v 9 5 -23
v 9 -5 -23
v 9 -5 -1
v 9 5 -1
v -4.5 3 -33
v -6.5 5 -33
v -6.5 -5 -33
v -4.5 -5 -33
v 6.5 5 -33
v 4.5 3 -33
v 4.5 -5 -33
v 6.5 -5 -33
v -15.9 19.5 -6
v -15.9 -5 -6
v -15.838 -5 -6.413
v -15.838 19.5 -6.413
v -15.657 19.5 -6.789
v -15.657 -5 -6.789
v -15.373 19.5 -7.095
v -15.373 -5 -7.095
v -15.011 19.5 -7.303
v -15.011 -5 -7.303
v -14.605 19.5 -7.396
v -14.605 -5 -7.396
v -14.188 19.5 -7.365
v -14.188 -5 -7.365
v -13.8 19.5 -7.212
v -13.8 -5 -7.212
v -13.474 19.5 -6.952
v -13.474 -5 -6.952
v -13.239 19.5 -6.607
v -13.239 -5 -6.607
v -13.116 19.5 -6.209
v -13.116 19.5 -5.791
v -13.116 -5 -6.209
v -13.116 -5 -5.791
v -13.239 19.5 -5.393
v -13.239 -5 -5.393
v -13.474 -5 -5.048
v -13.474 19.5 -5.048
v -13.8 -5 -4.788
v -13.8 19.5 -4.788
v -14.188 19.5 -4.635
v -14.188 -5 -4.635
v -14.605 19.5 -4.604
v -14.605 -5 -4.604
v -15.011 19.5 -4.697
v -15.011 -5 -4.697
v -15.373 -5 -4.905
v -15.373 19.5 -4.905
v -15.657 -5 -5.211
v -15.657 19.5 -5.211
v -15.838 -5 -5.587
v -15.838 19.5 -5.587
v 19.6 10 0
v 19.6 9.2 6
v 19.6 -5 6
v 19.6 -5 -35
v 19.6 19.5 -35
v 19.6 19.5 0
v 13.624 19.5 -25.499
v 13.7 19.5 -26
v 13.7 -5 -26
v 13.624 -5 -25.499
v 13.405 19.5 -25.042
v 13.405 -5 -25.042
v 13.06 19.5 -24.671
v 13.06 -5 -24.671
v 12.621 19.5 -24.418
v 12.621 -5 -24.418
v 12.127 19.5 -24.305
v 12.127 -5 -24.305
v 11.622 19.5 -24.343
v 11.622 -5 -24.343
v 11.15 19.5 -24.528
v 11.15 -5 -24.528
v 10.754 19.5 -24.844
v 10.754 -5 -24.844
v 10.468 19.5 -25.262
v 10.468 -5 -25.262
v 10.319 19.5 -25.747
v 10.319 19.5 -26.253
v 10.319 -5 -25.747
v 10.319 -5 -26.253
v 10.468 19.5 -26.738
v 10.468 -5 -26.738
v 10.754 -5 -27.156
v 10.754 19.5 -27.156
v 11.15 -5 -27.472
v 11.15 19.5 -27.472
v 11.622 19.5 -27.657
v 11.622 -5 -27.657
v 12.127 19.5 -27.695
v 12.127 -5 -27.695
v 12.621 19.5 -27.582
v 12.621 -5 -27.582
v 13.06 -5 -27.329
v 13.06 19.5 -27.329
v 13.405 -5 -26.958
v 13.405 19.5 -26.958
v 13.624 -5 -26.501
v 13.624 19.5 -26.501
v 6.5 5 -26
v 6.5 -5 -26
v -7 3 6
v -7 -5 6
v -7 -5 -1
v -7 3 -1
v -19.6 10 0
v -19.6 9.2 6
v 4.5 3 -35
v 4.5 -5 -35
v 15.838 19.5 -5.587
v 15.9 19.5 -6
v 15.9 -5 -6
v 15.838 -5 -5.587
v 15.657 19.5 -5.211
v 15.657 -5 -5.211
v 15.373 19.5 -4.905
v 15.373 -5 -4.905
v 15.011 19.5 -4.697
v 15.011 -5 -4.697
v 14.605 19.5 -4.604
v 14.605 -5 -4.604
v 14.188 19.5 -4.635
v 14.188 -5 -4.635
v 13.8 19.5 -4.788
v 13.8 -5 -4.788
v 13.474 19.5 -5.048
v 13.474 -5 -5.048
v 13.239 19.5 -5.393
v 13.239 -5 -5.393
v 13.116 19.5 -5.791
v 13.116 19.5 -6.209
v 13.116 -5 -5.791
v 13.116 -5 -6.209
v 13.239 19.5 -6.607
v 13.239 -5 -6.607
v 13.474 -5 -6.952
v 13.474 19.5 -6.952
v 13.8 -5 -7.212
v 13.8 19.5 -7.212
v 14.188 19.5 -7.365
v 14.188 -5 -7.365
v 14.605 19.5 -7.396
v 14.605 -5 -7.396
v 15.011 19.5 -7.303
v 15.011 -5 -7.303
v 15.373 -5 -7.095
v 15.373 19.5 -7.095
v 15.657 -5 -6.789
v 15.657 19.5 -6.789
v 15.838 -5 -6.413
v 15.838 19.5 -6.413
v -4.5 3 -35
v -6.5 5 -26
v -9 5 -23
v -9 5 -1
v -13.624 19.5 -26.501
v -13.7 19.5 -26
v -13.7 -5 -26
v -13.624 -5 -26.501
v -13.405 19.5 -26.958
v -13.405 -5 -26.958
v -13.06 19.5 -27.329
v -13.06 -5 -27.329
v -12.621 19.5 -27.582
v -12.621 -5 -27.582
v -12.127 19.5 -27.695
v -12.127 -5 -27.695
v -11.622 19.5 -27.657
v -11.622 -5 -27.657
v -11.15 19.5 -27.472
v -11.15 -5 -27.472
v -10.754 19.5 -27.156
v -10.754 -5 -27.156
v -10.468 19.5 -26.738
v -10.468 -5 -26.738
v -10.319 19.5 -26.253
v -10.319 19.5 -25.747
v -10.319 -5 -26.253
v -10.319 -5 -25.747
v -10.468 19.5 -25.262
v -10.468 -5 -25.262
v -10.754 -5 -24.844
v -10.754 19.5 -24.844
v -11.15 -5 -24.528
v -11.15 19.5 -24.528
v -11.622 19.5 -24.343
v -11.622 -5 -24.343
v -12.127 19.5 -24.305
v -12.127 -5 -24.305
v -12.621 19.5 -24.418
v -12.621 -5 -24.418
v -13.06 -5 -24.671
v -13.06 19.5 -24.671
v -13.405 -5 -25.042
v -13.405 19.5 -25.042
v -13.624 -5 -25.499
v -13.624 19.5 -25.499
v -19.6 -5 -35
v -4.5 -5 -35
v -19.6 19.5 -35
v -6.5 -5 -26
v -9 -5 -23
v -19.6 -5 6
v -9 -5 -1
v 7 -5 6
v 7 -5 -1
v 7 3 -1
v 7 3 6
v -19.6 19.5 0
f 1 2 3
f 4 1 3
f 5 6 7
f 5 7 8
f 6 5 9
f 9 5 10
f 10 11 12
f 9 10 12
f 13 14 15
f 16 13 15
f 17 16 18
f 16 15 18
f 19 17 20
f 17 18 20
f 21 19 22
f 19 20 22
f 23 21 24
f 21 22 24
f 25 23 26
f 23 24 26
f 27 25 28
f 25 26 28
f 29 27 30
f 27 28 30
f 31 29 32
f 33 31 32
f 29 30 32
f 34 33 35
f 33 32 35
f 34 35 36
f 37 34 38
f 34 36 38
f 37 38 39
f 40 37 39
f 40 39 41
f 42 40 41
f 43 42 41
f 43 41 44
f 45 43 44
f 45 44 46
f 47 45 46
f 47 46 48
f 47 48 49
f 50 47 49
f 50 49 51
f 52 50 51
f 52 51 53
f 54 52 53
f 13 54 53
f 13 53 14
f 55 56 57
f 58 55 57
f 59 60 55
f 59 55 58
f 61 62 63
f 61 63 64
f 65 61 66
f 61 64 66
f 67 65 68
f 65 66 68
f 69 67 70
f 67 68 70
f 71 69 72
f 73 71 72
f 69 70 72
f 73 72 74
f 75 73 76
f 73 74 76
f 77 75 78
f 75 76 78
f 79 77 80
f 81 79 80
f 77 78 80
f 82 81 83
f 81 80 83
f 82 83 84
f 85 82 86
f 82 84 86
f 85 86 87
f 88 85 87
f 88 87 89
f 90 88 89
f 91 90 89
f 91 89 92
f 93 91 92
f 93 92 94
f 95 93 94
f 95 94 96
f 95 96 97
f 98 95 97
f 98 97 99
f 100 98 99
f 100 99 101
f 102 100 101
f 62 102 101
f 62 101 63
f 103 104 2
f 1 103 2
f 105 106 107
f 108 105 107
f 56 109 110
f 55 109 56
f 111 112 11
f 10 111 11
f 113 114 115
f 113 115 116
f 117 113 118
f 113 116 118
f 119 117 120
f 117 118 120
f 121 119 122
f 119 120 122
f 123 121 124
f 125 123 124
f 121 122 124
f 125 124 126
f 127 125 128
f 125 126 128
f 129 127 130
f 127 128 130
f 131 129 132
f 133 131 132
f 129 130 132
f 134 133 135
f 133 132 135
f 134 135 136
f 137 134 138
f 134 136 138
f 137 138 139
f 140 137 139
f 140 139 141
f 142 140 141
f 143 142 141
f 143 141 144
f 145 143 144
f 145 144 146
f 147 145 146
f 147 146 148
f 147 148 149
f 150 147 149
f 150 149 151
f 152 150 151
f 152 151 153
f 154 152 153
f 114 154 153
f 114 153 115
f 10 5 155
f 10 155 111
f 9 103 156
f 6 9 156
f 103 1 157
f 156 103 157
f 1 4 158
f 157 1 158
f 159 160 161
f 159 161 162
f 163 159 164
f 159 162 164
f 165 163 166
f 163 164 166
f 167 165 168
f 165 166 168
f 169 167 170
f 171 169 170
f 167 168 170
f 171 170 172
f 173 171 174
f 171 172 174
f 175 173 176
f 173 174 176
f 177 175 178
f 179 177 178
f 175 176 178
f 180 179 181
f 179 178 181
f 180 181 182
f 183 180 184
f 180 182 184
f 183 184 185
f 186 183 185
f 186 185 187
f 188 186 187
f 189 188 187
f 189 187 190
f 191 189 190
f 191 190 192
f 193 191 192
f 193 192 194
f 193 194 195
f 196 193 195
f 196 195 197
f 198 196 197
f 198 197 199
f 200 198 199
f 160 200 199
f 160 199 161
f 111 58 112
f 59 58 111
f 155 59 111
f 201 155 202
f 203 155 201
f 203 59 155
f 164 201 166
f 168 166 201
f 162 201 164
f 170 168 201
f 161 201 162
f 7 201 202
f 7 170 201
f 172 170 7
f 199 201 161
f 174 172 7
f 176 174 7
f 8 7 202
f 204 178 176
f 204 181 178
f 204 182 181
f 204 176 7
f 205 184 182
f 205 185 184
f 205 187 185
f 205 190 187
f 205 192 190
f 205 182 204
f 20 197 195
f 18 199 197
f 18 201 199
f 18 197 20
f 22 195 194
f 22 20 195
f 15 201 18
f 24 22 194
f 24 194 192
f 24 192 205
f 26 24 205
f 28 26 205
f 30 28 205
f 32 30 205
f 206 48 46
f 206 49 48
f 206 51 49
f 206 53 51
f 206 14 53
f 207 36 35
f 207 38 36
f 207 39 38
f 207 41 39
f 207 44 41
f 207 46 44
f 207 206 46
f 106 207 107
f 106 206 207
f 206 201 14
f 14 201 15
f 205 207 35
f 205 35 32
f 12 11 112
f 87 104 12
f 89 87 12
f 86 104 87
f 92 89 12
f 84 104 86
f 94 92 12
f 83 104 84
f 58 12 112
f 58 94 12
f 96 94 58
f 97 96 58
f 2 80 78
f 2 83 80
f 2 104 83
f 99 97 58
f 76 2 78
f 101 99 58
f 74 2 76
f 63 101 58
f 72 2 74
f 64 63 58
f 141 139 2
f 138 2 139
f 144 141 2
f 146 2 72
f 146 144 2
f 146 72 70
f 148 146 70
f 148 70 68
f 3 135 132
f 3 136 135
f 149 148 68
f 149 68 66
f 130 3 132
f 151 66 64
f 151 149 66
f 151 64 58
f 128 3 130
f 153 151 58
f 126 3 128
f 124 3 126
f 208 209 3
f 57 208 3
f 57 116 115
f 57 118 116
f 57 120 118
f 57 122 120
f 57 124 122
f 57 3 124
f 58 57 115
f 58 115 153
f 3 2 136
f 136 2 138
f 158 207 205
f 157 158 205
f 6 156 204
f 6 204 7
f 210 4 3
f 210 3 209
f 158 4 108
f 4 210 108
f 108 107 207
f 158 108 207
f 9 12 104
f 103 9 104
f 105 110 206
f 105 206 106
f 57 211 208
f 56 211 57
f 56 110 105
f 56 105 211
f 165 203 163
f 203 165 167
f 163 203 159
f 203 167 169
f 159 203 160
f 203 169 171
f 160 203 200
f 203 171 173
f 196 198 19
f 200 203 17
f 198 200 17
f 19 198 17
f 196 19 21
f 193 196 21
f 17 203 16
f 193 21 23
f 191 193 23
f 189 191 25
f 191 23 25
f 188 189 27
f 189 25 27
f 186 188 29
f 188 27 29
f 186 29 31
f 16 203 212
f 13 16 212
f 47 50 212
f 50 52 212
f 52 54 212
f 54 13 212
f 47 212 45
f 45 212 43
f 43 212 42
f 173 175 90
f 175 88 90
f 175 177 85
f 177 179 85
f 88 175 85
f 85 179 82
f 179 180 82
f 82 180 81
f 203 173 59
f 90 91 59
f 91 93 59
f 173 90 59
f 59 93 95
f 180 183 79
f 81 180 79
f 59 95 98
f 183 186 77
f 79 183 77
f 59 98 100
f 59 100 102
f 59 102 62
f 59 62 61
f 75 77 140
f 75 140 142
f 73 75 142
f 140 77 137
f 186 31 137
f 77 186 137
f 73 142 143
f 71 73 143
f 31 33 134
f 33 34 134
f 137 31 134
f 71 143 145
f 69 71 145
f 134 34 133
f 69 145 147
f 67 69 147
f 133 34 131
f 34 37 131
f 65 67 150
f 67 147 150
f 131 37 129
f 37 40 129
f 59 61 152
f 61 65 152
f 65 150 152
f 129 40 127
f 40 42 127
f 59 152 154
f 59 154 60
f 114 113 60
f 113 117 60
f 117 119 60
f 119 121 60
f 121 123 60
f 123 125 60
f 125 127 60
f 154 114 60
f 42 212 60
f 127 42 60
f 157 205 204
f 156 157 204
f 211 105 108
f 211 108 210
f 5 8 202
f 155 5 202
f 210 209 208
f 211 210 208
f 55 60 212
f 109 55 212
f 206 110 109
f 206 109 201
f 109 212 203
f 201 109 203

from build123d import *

# Parameters (mm, degrees)
SKETCH_1_W          = 40
SKETCH_1_H          = 20
EXTRUDE_1_DEPTH     = 6
SKETCH_2_W          = 40
SKETCH_2_H          = 32.5
EXTRUDE_2_DEPTH     = 35
CUT_EXTRUDE_1_DEPTH = 13
CUT_EXTRUDE_2_DEPTH = 2
SKETCH_6_W          = 40
SKETCH_6_H          = 41
CUT_EXTRUDE_3_DEPTH = 5
SKETCH_8_R          = 1.7
SKETCH_8_R_2        = 1.4
CUT_EXTRUDE_4_DEPTH = 49.79805324
CUT_EXTRUDE_5_REACH = 48.165
SKETCH_9_W          = 40
SKETCH_9_H          = 3
CHAMFER_1_SIZE2     = 6
CHAMFER_1_SIZE      = 0.8
CUT_EXTRUDE_6_REACH = 49.173
SKETCH_11_W         = 0.4
SKETCH_11_H         = 41


with BuildPart() as part:
    # Эскиз1 → Бобышка-Вытянуть1 (new body)
    with BuildSketch(Plane.XY):
        Rectangle(SKETCH_1_W, SKETCH_1_H)
    extrude(amount=EXTRUDE_1_DEPTH)

    # Эскиз2 → Бобышка-Вытянуть2 (add)
    with BuildSketch(Plane(origin=(0, 0, 0), x_dir=(-1, 0, 0), z_dir=(0, 0, -1))):
        with Locations((0, 6.25)):
            Rectangle(SKETCH_2_W, SKETCH_2_H)
    extrude(amount=EXTRUDE_2_DEPTH)

    # Эскиз3 → Вырез-Вытянуть1 (cut)
    with BuildSketch(Plane.XZ.offset(10)):
        Polygon((-7, 6), (-7, -1), (-9, -1), (-9, -23), (-6.5, -26), (-6.5, -33), (-4.5, -33), (-4.5, -35), (4.5, -35), (4.5, -33), (6.5, -33), (6.5, -26), (9, -23), (9, -1), (7, -1), (7, 6), align=None)
    extrude(amount=-CUT_EXTRUDE_1_DEPTH, mode=Mode.SUBTRACT)

    # Эскиз5 → Вырез-Вытянуть2 (cut)
    with BuildSketch(Plane.XZ.offset(-3)):
        Polygon((-9, -1), (9, -1), (9, -23), (6.5, -26), (6.5, -33), (-6.5, -33), (-6.5, -26), (-9, -23), align=None)
    extrude(amount=-CUT_EXTRUDE_2_DEPTH, mode=Mode.SUBTRACT)

    # Эскиз6 → Вырез-Вытянуть3 (cut)
    with BuildSketch(Plane.XZ.offset(10)):
        with Locations((0, -14.5)):
            Rectangle(SKETCH_6_W, SKETCH_6_H)
    extrude(amount=-CUT_EXTRUDE_3_DEPTH, mode=Mode.SUBTRACT)

    # Эскиз8 → Вырез-Вытянуть4 (cut, through all)
    with BuildSketch(Plane.XZ.offset(5)):
        with Locations((12, -26)):
            Circle(SKETCH_8_R)
        with Locations((14.5, -6)):
            Circle(SKETCH_8_R_2)
        with Locations(Location((-12, -26, 0), (0, 0, 180))):
            Circle(SKETCH_8_R)
        with Locations(Location((-14.5, -6, 0), (0, 0, 180))):
            Circle(SKETCH_8_R_2)
    extrude(amount=-CUT_EXTRUDE_4_DEPTH, mode=Mode.SUBTRACT)

    # Вырез-Вытянуть5: up to this face of the body (flat: up to its plane)
    cut_extrude_5_end = Plane(part.part.faces().sort_by_distance((0, 9.432879377, -35))[0])
    # Эскиз9 → Вырез-Вытянуть5 (cut, up to the picked face)
    with BuildSketch(Plane.XY, mode=Mode.PRIVATE) as cut_extrude_5_sk1:
        with Locations((0, 21)):
            Rectangle(SKETCH_9_W, SKETCH_9_H)
    cut_extrude_5_tool1 = split(extrude(cut_extrude_5_sk1.sketch, amount=-CUT_EXTRUDE_5_REACH, mode=Mode.PRIVATE), bisect_by=cut_extrude_5_end, keep=Keep.BOTH, mode=Mode.PRIVATE)
    add(cut_extrude_5_tool1.solids().sort_by(Axis((0, 21, 0), (0, 0, -1)))[0], mode=Mode.SUBTRACT)

    # Фаска1
    chamfer_1_edges = [part.edges().sort_by_distance(p)[0] for p in [
        (0, 10, 6),
    ]]
    chamfer_1_side = [part.faces().sort_by_distance(p)[0] for p in [
        (0, 9.984, 6),
    ]]
    chamfer(chamfer_1_edges, length=CHAMFER_1_SIZE - 0.0001, length2=CHAMFER_1_SIZE2 - 0.0001, reference=chamfer_1_side[0])  # a hair under: the kernel refuses the full size

    # Вырез-Вытянуть6: up to this face of the body (flat: up to its plane)
    cut_extrude_6_end = Plane(part.part.faces().sort_by_distance((13.916834893, -5, -14.890204003))[0])
    # Эскиз11 → Вырез-Вытянуть6 (cut, up to the picked face)
    with BuildSketch(Plane(origin=(0, 19.5, 0), x_dir=(1, 0, 0), z_dir=(0, 1, 0)), mode=Mode.PRIVATE) as cut_extrude_6_sk1:
        with Locations((-19.8, 14.5)):
            Rectangle(SKETCH_11_W, SKETCH_11_H)
    cut_extrude_6_tool1 = split(extrude(cut_extrude_6_sk1.sketch, amount=-CUT_EXTRUDE_6_REACH, mode=Mode.PRIVATE), bisect_by=cut_extrude_6_end, keep=Keep.BOTH, mode=Mode.PRIVATE)
    # Эскиз11 → Вырез-Вытянуть6 (cut, up to the picked face)
    with BuildSketch(Plane(origin=(0, 19.5, 0), x_dir=(1, 0, 0), z_dir=(0, 1, 0)), mode=Mode.PRIVATE) as cut_extrude_6_sk2:
        with Locations((19.8, 14.5)):
            Rectangle(SKETCH_11_W, SKETCH_11_H)
    cut_extrude_6_tool2 = split(extrude(cut_extrude_6_sk2.sketch, amount=-CUT_EXTRUDE_6_REACH, mode=Mode.PRIVATE), bisect_by=cut_extrude_6_end, keep=Keep.BOTH, mode=Mode.PRIVATE)
    add(cut_extrude_6_tool1.solids().sort_by(Axis((-19.8, 19.5, -14.5), (0, -1, 0)))[0], mode=Mode.SUBTRACT)
    add(cut_extrude_6_tool2.solids().sort_by(Axis((19.8, 19.5, -14.5), (0, -1, 0)))[0], mode=Mode.SUBTRACT)


solid = part.part
